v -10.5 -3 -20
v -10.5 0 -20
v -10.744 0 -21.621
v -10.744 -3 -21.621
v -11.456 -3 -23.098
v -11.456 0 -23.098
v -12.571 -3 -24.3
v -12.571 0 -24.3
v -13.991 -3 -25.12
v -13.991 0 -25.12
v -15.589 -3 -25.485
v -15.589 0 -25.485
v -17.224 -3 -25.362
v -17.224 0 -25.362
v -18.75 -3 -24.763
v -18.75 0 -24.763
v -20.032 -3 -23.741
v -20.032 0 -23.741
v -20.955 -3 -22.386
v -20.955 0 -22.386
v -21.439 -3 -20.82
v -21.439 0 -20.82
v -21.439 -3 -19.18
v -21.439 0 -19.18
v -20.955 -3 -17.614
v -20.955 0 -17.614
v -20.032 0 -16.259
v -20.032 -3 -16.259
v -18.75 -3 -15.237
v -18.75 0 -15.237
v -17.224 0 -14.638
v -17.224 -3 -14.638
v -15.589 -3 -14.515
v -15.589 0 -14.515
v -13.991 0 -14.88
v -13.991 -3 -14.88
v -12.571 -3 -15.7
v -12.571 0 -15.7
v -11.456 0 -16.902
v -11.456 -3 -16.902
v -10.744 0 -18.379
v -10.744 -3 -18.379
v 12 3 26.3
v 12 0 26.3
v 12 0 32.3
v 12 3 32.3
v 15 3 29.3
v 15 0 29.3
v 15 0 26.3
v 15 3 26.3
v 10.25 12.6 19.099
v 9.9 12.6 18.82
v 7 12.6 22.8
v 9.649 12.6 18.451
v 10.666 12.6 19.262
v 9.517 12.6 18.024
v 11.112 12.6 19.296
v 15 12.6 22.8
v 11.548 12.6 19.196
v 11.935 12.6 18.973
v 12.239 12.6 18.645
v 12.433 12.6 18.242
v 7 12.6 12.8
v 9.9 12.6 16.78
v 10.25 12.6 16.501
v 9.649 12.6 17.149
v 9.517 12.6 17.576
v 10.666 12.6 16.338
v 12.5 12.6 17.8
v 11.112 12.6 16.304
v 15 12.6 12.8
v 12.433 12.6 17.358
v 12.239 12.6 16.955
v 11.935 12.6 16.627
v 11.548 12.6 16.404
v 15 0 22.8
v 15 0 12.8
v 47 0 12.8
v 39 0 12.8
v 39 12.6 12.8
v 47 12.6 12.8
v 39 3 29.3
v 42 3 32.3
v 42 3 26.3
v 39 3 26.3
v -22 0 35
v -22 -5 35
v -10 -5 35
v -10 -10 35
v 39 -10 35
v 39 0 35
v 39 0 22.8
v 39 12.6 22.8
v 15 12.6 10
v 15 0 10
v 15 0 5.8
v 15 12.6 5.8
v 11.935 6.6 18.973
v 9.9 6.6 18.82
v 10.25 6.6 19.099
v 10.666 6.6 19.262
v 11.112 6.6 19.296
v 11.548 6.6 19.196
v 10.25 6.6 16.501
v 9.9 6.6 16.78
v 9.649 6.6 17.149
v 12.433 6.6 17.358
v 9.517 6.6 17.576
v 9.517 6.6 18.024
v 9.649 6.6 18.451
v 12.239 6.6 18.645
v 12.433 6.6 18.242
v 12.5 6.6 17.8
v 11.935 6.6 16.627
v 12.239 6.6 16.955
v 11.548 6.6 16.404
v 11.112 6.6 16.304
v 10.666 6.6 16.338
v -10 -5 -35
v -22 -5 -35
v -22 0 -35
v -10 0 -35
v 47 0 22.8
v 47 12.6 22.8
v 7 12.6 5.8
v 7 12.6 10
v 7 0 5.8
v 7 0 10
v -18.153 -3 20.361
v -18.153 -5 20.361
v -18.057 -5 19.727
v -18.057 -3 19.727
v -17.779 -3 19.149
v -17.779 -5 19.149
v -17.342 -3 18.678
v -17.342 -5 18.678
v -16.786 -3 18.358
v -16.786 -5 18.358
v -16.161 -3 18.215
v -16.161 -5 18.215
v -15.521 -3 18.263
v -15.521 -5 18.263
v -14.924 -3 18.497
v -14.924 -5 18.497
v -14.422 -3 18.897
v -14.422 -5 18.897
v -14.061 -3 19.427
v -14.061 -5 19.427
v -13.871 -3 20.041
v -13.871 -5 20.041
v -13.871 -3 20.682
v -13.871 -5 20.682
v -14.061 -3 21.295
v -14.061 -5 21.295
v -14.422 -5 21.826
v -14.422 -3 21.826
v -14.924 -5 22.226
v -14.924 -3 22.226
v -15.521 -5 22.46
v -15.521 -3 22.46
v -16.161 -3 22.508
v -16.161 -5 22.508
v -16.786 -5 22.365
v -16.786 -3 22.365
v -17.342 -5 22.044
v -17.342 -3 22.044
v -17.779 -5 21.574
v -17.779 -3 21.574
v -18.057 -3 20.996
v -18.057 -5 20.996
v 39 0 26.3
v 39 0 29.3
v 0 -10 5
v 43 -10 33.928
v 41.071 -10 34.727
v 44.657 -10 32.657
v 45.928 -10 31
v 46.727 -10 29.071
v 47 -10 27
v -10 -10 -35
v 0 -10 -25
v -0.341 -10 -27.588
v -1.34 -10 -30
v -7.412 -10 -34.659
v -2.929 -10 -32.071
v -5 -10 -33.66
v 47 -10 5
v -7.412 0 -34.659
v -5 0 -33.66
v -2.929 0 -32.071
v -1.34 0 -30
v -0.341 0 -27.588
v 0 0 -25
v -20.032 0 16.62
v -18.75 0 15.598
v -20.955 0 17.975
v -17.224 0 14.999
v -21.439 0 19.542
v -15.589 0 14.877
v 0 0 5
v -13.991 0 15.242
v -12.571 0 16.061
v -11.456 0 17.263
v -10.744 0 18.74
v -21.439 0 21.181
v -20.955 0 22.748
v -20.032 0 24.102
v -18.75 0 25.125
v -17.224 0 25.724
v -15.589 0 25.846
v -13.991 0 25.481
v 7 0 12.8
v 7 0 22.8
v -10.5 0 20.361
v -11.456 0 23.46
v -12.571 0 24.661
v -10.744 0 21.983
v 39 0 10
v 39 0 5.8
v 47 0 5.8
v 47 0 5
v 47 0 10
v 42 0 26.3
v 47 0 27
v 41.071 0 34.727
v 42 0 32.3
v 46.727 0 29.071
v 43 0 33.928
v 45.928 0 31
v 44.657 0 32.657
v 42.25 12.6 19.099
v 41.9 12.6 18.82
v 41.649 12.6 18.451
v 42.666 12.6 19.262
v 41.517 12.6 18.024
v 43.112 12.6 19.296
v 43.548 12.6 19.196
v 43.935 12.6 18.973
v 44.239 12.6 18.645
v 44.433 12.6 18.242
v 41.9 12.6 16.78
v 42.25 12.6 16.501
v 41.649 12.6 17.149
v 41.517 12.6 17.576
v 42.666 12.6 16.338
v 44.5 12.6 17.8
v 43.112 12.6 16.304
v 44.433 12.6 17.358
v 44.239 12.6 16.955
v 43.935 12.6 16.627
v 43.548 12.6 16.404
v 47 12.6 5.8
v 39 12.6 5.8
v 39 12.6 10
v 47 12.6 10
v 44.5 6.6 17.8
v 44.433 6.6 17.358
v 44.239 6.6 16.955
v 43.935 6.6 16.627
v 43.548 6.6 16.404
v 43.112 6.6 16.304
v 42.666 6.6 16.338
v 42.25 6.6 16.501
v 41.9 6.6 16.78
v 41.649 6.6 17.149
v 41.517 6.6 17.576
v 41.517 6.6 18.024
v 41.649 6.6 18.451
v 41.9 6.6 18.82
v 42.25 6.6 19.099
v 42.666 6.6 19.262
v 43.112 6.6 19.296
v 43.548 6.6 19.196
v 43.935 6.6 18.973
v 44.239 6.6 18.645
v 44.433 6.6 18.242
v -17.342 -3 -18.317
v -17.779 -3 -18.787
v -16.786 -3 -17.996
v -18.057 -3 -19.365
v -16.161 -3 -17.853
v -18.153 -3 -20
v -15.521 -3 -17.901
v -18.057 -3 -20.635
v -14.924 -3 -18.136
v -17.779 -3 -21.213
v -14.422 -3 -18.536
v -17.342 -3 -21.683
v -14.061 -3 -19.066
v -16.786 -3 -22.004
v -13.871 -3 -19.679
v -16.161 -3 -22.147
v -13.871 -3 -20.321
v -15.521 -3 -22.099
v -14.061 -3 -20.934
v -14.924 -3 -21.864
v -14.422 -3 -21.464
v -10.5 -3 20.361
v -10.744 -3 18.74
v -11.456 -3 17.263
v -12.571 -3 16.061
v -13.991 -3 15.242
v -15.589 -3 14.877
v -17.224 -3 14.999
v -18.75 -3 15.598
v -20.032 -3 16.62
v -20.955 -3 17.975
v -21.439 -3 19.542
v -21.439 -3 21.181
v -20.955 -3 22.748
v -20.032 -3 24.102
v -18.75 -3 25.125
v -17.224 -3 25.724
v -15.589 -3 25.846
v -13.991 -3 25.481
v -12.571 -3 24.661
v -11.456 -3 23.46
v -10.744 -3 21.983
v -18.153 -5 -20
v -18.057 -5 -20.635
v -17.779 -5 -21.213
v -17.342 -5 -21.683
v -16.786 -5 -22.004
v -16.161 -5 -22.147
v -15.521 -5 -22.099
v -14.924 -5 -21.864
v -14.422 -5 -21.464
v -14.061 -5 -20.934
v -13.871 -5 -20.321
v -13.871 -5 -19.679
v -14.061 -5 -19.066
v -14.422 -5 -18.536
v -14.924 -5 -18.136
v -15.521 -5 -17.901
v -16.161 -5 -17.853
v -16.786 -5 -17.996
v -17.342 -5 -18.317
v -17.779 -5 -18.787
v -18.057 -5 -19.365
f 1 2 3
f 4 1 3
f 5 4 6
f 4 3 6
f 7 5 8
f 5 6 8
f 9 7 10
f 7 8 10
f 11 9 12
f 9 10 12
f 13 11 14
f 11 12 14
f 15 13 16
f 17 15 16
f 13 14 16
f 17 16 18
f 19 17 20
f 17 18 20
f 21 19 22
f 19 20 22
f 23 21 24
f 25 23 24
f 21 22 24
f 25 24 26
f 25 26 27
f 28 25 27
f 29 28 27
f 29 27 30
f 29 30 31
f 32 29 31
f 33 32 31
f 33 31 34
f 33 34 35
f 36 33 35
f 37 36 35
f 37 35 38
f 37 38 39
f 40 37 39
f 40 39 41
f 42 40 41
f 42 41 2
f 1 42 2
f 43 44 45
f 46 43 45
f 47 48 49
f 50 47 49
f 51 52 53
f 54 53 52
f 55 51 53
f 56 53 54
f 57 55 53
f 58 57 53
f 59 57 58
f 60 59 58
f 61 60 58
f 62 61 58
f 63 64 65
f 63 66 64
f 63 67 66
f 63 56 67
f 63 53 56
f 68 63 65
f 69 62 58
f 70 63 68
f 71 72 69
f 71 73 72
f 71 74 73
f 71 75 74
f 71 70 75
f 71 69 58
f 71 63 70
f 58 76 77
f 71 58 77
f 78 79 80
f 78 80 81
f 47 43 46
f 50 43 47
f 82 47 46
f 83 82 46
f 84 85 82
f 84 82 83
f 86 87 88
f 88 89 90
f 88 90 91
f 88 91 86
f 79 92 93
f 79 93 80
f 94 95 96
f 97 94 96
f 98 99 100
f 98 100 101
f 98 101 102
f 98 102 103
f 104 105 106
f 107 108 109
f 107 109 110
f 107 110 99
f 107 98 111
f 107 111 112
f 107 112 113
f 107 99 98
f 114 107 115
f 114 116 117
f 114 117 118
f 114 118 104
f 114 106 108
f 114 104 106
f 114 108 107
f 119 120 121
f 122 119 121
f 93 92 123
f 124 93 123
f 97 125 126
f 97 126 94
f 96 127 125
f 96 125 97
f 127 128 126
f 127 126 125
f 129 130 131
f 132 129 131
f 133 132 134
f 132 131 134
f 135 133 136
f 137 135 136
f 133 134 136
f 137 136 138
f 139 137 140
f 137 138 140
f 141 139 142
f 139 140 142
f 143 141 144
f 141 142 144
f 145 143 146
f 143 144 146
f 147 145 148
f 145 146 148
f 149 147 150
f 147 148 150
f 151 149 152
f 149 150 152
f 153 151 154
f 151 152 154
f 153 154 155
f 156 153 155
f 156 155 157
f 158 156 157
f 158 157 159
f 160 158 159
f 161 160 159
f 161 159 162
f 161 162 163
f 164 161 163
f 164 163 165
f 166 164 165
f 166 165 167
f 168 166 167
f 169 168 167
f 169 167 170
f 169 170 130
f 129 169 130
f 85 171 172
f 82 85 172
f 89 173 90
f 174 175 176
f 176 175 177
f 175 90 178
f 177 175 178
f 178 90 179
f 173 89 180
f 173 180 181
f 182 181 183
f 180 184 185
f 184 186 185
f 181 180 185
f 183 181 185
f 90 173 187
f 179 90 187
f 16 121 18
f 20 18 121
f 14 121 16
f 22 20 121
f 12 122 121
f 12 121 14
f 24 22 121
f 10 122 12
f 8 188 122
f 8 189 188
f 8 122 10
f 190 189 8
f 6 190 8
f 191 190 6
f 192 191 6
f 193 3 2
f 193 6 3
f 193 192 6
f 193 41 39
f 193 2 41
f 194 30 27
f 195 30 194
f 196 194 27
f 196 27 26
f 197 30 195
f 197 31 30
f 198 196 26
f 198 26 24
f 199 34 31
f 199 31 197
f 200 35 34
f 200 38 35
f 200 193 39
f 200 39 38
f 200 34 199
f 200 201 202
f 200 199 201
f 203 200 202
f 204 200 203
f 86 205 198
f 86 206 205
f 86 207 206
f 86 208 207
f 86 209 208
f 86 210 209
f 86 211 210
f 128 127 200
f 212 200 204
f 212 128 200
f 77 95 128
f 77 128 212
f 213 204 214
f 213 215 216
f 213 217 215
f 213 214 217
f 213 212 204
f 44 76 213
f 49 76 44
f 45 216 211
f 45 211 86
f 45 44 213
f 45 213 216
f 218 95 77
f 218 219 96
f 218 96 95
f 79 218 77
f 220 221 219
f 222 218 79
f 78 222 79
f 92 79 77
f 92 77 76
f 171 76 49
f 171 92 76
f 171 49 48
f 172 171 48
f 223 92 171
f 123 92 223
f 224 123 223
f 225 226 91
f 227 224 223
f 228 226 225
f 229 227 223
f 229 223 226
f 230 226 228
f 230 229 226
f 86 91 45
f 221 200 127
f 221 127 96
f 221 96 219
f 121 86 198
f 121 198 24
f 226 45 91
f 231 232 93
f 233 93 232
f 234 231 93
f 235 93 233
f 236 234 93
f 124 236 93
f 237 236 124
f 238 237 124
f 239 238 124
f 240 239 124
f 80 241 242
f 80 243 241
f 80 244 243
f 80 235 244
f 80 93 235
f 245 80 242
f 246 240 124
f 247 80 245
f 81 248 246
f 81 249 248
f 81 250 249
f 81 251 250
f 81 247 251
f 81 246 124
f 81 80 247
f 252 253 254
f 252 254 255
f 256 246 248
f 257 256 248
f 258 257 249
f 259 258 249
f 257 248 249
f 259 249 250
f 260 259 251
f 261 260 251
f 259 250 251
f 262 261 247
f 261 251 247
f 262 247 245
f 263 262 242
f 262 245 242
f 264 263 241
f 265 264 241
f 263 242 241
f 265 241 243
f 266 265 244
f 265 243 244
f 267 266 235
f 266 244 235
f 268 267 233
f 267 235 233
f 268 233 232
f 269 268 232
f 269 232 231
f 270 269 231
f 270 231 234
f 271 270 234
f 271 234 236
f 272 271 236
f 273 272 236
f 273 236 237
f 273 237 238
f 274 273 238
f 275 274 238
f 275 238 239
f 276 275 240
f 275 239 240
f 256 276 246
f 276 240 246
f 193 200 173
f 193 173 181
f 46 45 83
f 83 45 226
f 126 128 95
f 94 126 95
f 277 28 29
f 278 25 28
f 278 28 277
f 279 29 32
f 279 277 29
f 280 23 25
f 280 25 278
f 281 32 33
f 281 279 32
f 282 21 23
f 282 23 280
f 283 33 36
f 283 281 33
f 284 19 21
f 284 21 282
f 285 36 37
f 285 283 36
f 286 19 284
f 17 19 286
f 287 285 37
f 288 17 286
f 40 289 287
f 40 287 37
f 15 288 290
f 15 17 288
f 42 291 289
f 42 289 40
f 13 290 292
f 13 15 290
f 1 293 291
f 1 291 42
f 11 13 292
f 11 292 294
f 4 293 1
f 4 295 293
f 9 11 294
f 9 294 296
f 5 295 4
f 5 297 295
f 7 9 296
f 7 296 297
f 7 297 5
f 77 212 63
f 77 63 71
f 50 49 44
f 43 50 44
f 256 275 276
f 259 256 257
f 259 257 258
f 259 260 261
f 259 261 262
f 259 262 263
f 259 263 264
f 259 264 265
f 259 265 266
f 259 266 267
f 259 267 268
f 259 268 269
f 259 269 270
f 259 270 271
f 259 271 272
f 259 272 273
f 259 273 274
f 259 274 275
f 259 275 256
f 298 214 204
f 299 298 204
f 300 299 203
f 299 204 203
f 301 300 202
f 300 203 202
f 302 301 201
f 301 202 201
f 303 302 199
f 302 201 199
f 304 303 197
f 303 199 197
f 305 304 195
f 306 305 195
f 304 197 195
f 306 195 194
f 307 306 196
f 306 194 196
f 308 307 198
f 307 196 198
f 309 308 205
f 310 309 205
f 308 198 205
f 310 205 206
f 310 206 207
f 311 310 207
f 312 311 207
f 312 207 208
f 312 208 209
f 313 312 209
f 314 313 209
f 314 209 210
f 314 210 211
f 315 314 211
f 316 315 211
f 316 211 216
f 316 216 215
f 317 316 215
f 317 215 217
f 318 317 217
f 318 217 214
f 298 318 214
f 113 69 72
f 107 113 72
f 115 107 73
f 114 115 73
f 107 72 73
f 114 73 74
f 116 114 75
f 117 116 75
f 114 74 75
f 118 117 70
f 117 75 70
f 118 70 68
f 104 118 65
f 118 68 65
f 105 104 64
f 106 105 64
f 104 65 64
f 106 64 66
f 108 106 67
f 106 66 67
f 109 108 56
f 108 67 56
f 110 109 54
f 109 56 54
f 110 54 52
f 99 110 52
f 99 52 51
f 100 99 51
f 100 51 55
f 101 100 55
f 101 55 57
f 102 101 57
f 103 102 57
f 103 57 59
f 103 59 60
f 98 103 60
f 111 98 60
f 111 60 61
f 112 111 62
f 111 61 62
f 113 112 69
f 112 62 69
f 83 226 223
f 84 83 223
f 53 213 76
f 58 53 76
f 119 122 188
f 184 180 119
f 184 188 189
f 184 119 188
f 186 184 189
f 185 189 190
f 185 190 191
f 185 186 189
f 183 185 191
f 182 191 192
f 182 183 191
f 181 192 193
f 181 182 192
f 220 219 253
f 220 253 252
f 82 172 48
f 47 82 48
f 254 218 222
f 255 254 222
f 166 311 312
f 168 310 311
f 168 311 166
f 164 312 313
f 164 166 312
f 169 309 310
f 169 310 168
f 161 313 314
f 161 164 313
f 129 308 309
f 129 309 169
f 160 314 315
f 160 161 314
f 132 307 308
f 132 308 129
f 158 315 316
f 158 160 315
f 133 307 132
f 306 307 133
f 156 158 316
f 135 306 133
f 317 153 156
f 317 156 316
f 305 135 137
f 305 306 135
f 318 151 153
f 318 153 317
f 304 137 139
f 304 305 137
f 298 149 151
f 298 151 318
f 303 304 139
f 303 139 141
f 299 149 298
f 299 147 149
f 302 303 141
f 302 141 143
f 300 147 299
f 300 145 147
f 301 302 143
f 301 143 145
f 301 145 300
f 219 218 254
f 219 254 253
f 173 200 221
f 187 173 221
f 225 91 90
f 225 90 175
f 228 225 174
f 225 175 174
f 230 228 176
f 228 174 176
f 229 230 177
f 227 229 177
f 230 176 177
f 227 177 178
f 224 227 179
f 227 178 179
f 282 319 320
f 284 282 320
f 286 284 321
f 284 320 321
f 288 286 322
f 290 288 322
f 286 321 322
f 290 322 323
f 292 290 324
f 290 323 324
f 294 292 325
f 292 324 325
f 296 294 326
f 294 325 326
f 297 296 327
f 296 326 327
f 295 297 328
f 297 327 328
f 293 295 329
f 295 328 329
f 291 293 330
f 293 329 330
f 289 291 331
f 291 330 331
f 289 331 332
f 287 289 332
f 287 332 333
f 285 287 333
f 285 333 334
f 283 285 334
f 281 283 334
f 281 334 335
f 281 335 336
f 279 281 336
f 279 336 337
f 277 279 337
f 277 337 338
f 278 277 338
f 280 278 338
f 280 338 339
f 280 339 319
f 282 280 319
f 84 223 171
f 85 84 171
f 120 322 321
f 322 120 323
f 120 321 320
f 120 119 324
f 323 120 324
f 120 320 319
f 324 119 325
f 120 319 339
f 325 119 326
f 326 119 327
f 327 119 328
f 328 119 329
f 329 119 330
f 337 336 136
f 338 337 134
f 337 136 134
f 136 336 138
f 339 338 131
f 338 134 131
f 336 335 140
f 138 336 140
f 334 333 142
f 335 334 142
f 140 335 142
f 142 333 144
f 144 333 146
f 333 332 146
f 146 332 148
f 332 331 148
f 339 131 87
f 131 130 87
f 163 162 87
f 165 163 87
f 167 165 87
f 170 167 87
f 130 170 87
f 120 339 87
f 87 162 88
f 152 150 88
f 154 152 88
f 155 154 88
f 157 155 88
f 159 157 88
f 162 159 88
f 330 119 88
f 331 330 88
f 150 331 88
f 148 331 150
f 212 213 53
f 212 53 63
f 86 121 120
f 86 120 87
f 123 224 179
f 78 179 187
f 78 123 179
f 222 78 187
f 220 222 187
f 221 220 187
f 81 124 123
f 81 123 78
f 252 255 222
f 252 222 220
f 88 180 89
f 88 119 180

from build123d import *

# Parameters (mm, degrees)
SKETCH1_W                                       = 47
SKETCH1_H                                       = 30
BOSS_STRUCTURE_DEPTH                            = 10
SKETCH2_W                                       = 70
SKETCH2_H                                       = 5
BOSS_ATTACHE_DEPTH                              = 12
SERVO_W                                         = 8
SERVO_H                                         = 4.2
SERVO_H_2                                       = 10
BOSS_SERVO_1_DEPTH                              = 12.6
BOSS_SERVO_2_DEPTH                              = 3
FILLET1_R                                       = 10
FILLET2_R                                       = 8
SKETCH4_R                                       = 1.5
CUT_EXTRUDE1_DEPTH                              = 6
CBORE_FOR_6_PAN_HEAD_MACHINE_SCREW1_D           = 4.3053
CBORE_FOR_6_PAN_HEAD_MACHINE_SCREW1_DEPTH       = 5
CBORE_FOR_6_PAN_HEAD_MACHINE_SCREW1_CBORE_D     = 11.000000098
CBORE_FOR_6_PAN_HEAD_MACHINE_SCREW1_CBORE_DEPTH = 3.000000096


with BuildPart() as part:
    # Sketch1 → Boss-Structure (new body)
    with BuildSketch(Plane(origin=(0, 0, 0), x_dir=(1, 0, 0), z_dir=(0, 1, 0))):
        Polygon((0, 35), (-10, 35), (-10, -35), (0, -35), (0, -5), align=None)
        with Locations((23.5, -20)):
            Rectangle(SKETCH1_W, SKETCH1_H)
    extrude(amount=-BOSS_STRUCTURE_DEPTH)

    # Sketch2 → Boss-Attache (add)
    with BuildSketch(Plane.ZY.offset(10)):
        with Locations((0, -2.5)):
            Rectangle(SKETCH2_W, SKETCH2_H)
    extrude(amount=BOSS_ATTACHE_DEPTH)

    # Servo → Boss-Servo_1 (add)
    with BuildSketch(Plane(origin=(0, 0, 0), x_dir=(1, 0, 0), z_dir=(0, 1, 0))):
        with Locations((11, -7.9)):
            Rectangle(SERVO_W, SERVO_H)
        with Locations((11, -17.8)):
            Rectangle(SERVO_W, SERVO_H_2)
        with Locations((43, -17.8)):
            Rectangle(SERVO_W, SERVO_H_2)
        with Locations((43, -7.9)):
            Rectangle(SERVO_W, SERVO_H)
    extrude(amount=BOSS_SERVO_1_DEPTH)

    # Sketch3<3> → Boss-Servo_2 (add)
    with BuildSketch(Plane(origin=(0, 0, 0), x_dir=(1, 0, 0), z_dir=(0, 1, 0))):
        Polygon((15, -29.3), (15, -26.3), (12, -26.3), (12, -32.3), (27, -32.3), (27, -29.3), align=None)
        Polygon((42, -26.3), (39, -26.3), (39, -29.3), (27, -29.3), (27, -32.3), (42, -32.3), align=None)
    extrude(amount=BOSS_SERVO_2_DEPTH)

    # Fillet1
    fillet1_edges = [part.edges().sort_by_distance(p)[0] for p in [
        (0, -5, -35),
    ]]
    fillet(fillet1_edges, radius=FILLET1_R)

    # Fillet2
    fillet2_edges = [part.edges().sort_by_distance(p)[0] for p in [
        (47, -5, 35),
    ]]
    fillet(fillet2_edges, radius=FILLET2_R)

    # Sketch4 → Cut-Extrude1 (cut)
    with BuildSketch(Plane(origin=(0, 12.6, 0), x_dir=(1, 0, 0), z_dir=(0, 1, 0))):
        with Locations((11, -17.8)):
            Circle(SKETCH4_R)
        with Locations((43, -17.8)):
            Circle(SKETCH4_R)
    extrude(amount=-CUT_EXTRUDE1_DEPTH, mode=Mode.SUBTRACT)

    # CBORE for #6 Pan Head Machine Screw1
    with Locations(Plane(origin=(0, 0, 0), x_dir=(1, 0, 0), z_dir=(0, 1, 0))):
        with Locations((-16, 20), (-16, -20.361423436)):
            CounterBoreHole(CBORE_FOR_6_PAN_HEAD_MACHINE_SCREW1_D / 2, CBORE_FOR_6_PAN_HEAD_MACHINE_SCREW1_CBORE_D / 2, CBORE_FOR_6_PAN_HEAD_MACHINE_SCREW1_CBORE_DEPTH, depth=CBORE_FOR_6_PAN_HEAD_MACHINE_SCREW1_DEPTH)


solid = part.part
